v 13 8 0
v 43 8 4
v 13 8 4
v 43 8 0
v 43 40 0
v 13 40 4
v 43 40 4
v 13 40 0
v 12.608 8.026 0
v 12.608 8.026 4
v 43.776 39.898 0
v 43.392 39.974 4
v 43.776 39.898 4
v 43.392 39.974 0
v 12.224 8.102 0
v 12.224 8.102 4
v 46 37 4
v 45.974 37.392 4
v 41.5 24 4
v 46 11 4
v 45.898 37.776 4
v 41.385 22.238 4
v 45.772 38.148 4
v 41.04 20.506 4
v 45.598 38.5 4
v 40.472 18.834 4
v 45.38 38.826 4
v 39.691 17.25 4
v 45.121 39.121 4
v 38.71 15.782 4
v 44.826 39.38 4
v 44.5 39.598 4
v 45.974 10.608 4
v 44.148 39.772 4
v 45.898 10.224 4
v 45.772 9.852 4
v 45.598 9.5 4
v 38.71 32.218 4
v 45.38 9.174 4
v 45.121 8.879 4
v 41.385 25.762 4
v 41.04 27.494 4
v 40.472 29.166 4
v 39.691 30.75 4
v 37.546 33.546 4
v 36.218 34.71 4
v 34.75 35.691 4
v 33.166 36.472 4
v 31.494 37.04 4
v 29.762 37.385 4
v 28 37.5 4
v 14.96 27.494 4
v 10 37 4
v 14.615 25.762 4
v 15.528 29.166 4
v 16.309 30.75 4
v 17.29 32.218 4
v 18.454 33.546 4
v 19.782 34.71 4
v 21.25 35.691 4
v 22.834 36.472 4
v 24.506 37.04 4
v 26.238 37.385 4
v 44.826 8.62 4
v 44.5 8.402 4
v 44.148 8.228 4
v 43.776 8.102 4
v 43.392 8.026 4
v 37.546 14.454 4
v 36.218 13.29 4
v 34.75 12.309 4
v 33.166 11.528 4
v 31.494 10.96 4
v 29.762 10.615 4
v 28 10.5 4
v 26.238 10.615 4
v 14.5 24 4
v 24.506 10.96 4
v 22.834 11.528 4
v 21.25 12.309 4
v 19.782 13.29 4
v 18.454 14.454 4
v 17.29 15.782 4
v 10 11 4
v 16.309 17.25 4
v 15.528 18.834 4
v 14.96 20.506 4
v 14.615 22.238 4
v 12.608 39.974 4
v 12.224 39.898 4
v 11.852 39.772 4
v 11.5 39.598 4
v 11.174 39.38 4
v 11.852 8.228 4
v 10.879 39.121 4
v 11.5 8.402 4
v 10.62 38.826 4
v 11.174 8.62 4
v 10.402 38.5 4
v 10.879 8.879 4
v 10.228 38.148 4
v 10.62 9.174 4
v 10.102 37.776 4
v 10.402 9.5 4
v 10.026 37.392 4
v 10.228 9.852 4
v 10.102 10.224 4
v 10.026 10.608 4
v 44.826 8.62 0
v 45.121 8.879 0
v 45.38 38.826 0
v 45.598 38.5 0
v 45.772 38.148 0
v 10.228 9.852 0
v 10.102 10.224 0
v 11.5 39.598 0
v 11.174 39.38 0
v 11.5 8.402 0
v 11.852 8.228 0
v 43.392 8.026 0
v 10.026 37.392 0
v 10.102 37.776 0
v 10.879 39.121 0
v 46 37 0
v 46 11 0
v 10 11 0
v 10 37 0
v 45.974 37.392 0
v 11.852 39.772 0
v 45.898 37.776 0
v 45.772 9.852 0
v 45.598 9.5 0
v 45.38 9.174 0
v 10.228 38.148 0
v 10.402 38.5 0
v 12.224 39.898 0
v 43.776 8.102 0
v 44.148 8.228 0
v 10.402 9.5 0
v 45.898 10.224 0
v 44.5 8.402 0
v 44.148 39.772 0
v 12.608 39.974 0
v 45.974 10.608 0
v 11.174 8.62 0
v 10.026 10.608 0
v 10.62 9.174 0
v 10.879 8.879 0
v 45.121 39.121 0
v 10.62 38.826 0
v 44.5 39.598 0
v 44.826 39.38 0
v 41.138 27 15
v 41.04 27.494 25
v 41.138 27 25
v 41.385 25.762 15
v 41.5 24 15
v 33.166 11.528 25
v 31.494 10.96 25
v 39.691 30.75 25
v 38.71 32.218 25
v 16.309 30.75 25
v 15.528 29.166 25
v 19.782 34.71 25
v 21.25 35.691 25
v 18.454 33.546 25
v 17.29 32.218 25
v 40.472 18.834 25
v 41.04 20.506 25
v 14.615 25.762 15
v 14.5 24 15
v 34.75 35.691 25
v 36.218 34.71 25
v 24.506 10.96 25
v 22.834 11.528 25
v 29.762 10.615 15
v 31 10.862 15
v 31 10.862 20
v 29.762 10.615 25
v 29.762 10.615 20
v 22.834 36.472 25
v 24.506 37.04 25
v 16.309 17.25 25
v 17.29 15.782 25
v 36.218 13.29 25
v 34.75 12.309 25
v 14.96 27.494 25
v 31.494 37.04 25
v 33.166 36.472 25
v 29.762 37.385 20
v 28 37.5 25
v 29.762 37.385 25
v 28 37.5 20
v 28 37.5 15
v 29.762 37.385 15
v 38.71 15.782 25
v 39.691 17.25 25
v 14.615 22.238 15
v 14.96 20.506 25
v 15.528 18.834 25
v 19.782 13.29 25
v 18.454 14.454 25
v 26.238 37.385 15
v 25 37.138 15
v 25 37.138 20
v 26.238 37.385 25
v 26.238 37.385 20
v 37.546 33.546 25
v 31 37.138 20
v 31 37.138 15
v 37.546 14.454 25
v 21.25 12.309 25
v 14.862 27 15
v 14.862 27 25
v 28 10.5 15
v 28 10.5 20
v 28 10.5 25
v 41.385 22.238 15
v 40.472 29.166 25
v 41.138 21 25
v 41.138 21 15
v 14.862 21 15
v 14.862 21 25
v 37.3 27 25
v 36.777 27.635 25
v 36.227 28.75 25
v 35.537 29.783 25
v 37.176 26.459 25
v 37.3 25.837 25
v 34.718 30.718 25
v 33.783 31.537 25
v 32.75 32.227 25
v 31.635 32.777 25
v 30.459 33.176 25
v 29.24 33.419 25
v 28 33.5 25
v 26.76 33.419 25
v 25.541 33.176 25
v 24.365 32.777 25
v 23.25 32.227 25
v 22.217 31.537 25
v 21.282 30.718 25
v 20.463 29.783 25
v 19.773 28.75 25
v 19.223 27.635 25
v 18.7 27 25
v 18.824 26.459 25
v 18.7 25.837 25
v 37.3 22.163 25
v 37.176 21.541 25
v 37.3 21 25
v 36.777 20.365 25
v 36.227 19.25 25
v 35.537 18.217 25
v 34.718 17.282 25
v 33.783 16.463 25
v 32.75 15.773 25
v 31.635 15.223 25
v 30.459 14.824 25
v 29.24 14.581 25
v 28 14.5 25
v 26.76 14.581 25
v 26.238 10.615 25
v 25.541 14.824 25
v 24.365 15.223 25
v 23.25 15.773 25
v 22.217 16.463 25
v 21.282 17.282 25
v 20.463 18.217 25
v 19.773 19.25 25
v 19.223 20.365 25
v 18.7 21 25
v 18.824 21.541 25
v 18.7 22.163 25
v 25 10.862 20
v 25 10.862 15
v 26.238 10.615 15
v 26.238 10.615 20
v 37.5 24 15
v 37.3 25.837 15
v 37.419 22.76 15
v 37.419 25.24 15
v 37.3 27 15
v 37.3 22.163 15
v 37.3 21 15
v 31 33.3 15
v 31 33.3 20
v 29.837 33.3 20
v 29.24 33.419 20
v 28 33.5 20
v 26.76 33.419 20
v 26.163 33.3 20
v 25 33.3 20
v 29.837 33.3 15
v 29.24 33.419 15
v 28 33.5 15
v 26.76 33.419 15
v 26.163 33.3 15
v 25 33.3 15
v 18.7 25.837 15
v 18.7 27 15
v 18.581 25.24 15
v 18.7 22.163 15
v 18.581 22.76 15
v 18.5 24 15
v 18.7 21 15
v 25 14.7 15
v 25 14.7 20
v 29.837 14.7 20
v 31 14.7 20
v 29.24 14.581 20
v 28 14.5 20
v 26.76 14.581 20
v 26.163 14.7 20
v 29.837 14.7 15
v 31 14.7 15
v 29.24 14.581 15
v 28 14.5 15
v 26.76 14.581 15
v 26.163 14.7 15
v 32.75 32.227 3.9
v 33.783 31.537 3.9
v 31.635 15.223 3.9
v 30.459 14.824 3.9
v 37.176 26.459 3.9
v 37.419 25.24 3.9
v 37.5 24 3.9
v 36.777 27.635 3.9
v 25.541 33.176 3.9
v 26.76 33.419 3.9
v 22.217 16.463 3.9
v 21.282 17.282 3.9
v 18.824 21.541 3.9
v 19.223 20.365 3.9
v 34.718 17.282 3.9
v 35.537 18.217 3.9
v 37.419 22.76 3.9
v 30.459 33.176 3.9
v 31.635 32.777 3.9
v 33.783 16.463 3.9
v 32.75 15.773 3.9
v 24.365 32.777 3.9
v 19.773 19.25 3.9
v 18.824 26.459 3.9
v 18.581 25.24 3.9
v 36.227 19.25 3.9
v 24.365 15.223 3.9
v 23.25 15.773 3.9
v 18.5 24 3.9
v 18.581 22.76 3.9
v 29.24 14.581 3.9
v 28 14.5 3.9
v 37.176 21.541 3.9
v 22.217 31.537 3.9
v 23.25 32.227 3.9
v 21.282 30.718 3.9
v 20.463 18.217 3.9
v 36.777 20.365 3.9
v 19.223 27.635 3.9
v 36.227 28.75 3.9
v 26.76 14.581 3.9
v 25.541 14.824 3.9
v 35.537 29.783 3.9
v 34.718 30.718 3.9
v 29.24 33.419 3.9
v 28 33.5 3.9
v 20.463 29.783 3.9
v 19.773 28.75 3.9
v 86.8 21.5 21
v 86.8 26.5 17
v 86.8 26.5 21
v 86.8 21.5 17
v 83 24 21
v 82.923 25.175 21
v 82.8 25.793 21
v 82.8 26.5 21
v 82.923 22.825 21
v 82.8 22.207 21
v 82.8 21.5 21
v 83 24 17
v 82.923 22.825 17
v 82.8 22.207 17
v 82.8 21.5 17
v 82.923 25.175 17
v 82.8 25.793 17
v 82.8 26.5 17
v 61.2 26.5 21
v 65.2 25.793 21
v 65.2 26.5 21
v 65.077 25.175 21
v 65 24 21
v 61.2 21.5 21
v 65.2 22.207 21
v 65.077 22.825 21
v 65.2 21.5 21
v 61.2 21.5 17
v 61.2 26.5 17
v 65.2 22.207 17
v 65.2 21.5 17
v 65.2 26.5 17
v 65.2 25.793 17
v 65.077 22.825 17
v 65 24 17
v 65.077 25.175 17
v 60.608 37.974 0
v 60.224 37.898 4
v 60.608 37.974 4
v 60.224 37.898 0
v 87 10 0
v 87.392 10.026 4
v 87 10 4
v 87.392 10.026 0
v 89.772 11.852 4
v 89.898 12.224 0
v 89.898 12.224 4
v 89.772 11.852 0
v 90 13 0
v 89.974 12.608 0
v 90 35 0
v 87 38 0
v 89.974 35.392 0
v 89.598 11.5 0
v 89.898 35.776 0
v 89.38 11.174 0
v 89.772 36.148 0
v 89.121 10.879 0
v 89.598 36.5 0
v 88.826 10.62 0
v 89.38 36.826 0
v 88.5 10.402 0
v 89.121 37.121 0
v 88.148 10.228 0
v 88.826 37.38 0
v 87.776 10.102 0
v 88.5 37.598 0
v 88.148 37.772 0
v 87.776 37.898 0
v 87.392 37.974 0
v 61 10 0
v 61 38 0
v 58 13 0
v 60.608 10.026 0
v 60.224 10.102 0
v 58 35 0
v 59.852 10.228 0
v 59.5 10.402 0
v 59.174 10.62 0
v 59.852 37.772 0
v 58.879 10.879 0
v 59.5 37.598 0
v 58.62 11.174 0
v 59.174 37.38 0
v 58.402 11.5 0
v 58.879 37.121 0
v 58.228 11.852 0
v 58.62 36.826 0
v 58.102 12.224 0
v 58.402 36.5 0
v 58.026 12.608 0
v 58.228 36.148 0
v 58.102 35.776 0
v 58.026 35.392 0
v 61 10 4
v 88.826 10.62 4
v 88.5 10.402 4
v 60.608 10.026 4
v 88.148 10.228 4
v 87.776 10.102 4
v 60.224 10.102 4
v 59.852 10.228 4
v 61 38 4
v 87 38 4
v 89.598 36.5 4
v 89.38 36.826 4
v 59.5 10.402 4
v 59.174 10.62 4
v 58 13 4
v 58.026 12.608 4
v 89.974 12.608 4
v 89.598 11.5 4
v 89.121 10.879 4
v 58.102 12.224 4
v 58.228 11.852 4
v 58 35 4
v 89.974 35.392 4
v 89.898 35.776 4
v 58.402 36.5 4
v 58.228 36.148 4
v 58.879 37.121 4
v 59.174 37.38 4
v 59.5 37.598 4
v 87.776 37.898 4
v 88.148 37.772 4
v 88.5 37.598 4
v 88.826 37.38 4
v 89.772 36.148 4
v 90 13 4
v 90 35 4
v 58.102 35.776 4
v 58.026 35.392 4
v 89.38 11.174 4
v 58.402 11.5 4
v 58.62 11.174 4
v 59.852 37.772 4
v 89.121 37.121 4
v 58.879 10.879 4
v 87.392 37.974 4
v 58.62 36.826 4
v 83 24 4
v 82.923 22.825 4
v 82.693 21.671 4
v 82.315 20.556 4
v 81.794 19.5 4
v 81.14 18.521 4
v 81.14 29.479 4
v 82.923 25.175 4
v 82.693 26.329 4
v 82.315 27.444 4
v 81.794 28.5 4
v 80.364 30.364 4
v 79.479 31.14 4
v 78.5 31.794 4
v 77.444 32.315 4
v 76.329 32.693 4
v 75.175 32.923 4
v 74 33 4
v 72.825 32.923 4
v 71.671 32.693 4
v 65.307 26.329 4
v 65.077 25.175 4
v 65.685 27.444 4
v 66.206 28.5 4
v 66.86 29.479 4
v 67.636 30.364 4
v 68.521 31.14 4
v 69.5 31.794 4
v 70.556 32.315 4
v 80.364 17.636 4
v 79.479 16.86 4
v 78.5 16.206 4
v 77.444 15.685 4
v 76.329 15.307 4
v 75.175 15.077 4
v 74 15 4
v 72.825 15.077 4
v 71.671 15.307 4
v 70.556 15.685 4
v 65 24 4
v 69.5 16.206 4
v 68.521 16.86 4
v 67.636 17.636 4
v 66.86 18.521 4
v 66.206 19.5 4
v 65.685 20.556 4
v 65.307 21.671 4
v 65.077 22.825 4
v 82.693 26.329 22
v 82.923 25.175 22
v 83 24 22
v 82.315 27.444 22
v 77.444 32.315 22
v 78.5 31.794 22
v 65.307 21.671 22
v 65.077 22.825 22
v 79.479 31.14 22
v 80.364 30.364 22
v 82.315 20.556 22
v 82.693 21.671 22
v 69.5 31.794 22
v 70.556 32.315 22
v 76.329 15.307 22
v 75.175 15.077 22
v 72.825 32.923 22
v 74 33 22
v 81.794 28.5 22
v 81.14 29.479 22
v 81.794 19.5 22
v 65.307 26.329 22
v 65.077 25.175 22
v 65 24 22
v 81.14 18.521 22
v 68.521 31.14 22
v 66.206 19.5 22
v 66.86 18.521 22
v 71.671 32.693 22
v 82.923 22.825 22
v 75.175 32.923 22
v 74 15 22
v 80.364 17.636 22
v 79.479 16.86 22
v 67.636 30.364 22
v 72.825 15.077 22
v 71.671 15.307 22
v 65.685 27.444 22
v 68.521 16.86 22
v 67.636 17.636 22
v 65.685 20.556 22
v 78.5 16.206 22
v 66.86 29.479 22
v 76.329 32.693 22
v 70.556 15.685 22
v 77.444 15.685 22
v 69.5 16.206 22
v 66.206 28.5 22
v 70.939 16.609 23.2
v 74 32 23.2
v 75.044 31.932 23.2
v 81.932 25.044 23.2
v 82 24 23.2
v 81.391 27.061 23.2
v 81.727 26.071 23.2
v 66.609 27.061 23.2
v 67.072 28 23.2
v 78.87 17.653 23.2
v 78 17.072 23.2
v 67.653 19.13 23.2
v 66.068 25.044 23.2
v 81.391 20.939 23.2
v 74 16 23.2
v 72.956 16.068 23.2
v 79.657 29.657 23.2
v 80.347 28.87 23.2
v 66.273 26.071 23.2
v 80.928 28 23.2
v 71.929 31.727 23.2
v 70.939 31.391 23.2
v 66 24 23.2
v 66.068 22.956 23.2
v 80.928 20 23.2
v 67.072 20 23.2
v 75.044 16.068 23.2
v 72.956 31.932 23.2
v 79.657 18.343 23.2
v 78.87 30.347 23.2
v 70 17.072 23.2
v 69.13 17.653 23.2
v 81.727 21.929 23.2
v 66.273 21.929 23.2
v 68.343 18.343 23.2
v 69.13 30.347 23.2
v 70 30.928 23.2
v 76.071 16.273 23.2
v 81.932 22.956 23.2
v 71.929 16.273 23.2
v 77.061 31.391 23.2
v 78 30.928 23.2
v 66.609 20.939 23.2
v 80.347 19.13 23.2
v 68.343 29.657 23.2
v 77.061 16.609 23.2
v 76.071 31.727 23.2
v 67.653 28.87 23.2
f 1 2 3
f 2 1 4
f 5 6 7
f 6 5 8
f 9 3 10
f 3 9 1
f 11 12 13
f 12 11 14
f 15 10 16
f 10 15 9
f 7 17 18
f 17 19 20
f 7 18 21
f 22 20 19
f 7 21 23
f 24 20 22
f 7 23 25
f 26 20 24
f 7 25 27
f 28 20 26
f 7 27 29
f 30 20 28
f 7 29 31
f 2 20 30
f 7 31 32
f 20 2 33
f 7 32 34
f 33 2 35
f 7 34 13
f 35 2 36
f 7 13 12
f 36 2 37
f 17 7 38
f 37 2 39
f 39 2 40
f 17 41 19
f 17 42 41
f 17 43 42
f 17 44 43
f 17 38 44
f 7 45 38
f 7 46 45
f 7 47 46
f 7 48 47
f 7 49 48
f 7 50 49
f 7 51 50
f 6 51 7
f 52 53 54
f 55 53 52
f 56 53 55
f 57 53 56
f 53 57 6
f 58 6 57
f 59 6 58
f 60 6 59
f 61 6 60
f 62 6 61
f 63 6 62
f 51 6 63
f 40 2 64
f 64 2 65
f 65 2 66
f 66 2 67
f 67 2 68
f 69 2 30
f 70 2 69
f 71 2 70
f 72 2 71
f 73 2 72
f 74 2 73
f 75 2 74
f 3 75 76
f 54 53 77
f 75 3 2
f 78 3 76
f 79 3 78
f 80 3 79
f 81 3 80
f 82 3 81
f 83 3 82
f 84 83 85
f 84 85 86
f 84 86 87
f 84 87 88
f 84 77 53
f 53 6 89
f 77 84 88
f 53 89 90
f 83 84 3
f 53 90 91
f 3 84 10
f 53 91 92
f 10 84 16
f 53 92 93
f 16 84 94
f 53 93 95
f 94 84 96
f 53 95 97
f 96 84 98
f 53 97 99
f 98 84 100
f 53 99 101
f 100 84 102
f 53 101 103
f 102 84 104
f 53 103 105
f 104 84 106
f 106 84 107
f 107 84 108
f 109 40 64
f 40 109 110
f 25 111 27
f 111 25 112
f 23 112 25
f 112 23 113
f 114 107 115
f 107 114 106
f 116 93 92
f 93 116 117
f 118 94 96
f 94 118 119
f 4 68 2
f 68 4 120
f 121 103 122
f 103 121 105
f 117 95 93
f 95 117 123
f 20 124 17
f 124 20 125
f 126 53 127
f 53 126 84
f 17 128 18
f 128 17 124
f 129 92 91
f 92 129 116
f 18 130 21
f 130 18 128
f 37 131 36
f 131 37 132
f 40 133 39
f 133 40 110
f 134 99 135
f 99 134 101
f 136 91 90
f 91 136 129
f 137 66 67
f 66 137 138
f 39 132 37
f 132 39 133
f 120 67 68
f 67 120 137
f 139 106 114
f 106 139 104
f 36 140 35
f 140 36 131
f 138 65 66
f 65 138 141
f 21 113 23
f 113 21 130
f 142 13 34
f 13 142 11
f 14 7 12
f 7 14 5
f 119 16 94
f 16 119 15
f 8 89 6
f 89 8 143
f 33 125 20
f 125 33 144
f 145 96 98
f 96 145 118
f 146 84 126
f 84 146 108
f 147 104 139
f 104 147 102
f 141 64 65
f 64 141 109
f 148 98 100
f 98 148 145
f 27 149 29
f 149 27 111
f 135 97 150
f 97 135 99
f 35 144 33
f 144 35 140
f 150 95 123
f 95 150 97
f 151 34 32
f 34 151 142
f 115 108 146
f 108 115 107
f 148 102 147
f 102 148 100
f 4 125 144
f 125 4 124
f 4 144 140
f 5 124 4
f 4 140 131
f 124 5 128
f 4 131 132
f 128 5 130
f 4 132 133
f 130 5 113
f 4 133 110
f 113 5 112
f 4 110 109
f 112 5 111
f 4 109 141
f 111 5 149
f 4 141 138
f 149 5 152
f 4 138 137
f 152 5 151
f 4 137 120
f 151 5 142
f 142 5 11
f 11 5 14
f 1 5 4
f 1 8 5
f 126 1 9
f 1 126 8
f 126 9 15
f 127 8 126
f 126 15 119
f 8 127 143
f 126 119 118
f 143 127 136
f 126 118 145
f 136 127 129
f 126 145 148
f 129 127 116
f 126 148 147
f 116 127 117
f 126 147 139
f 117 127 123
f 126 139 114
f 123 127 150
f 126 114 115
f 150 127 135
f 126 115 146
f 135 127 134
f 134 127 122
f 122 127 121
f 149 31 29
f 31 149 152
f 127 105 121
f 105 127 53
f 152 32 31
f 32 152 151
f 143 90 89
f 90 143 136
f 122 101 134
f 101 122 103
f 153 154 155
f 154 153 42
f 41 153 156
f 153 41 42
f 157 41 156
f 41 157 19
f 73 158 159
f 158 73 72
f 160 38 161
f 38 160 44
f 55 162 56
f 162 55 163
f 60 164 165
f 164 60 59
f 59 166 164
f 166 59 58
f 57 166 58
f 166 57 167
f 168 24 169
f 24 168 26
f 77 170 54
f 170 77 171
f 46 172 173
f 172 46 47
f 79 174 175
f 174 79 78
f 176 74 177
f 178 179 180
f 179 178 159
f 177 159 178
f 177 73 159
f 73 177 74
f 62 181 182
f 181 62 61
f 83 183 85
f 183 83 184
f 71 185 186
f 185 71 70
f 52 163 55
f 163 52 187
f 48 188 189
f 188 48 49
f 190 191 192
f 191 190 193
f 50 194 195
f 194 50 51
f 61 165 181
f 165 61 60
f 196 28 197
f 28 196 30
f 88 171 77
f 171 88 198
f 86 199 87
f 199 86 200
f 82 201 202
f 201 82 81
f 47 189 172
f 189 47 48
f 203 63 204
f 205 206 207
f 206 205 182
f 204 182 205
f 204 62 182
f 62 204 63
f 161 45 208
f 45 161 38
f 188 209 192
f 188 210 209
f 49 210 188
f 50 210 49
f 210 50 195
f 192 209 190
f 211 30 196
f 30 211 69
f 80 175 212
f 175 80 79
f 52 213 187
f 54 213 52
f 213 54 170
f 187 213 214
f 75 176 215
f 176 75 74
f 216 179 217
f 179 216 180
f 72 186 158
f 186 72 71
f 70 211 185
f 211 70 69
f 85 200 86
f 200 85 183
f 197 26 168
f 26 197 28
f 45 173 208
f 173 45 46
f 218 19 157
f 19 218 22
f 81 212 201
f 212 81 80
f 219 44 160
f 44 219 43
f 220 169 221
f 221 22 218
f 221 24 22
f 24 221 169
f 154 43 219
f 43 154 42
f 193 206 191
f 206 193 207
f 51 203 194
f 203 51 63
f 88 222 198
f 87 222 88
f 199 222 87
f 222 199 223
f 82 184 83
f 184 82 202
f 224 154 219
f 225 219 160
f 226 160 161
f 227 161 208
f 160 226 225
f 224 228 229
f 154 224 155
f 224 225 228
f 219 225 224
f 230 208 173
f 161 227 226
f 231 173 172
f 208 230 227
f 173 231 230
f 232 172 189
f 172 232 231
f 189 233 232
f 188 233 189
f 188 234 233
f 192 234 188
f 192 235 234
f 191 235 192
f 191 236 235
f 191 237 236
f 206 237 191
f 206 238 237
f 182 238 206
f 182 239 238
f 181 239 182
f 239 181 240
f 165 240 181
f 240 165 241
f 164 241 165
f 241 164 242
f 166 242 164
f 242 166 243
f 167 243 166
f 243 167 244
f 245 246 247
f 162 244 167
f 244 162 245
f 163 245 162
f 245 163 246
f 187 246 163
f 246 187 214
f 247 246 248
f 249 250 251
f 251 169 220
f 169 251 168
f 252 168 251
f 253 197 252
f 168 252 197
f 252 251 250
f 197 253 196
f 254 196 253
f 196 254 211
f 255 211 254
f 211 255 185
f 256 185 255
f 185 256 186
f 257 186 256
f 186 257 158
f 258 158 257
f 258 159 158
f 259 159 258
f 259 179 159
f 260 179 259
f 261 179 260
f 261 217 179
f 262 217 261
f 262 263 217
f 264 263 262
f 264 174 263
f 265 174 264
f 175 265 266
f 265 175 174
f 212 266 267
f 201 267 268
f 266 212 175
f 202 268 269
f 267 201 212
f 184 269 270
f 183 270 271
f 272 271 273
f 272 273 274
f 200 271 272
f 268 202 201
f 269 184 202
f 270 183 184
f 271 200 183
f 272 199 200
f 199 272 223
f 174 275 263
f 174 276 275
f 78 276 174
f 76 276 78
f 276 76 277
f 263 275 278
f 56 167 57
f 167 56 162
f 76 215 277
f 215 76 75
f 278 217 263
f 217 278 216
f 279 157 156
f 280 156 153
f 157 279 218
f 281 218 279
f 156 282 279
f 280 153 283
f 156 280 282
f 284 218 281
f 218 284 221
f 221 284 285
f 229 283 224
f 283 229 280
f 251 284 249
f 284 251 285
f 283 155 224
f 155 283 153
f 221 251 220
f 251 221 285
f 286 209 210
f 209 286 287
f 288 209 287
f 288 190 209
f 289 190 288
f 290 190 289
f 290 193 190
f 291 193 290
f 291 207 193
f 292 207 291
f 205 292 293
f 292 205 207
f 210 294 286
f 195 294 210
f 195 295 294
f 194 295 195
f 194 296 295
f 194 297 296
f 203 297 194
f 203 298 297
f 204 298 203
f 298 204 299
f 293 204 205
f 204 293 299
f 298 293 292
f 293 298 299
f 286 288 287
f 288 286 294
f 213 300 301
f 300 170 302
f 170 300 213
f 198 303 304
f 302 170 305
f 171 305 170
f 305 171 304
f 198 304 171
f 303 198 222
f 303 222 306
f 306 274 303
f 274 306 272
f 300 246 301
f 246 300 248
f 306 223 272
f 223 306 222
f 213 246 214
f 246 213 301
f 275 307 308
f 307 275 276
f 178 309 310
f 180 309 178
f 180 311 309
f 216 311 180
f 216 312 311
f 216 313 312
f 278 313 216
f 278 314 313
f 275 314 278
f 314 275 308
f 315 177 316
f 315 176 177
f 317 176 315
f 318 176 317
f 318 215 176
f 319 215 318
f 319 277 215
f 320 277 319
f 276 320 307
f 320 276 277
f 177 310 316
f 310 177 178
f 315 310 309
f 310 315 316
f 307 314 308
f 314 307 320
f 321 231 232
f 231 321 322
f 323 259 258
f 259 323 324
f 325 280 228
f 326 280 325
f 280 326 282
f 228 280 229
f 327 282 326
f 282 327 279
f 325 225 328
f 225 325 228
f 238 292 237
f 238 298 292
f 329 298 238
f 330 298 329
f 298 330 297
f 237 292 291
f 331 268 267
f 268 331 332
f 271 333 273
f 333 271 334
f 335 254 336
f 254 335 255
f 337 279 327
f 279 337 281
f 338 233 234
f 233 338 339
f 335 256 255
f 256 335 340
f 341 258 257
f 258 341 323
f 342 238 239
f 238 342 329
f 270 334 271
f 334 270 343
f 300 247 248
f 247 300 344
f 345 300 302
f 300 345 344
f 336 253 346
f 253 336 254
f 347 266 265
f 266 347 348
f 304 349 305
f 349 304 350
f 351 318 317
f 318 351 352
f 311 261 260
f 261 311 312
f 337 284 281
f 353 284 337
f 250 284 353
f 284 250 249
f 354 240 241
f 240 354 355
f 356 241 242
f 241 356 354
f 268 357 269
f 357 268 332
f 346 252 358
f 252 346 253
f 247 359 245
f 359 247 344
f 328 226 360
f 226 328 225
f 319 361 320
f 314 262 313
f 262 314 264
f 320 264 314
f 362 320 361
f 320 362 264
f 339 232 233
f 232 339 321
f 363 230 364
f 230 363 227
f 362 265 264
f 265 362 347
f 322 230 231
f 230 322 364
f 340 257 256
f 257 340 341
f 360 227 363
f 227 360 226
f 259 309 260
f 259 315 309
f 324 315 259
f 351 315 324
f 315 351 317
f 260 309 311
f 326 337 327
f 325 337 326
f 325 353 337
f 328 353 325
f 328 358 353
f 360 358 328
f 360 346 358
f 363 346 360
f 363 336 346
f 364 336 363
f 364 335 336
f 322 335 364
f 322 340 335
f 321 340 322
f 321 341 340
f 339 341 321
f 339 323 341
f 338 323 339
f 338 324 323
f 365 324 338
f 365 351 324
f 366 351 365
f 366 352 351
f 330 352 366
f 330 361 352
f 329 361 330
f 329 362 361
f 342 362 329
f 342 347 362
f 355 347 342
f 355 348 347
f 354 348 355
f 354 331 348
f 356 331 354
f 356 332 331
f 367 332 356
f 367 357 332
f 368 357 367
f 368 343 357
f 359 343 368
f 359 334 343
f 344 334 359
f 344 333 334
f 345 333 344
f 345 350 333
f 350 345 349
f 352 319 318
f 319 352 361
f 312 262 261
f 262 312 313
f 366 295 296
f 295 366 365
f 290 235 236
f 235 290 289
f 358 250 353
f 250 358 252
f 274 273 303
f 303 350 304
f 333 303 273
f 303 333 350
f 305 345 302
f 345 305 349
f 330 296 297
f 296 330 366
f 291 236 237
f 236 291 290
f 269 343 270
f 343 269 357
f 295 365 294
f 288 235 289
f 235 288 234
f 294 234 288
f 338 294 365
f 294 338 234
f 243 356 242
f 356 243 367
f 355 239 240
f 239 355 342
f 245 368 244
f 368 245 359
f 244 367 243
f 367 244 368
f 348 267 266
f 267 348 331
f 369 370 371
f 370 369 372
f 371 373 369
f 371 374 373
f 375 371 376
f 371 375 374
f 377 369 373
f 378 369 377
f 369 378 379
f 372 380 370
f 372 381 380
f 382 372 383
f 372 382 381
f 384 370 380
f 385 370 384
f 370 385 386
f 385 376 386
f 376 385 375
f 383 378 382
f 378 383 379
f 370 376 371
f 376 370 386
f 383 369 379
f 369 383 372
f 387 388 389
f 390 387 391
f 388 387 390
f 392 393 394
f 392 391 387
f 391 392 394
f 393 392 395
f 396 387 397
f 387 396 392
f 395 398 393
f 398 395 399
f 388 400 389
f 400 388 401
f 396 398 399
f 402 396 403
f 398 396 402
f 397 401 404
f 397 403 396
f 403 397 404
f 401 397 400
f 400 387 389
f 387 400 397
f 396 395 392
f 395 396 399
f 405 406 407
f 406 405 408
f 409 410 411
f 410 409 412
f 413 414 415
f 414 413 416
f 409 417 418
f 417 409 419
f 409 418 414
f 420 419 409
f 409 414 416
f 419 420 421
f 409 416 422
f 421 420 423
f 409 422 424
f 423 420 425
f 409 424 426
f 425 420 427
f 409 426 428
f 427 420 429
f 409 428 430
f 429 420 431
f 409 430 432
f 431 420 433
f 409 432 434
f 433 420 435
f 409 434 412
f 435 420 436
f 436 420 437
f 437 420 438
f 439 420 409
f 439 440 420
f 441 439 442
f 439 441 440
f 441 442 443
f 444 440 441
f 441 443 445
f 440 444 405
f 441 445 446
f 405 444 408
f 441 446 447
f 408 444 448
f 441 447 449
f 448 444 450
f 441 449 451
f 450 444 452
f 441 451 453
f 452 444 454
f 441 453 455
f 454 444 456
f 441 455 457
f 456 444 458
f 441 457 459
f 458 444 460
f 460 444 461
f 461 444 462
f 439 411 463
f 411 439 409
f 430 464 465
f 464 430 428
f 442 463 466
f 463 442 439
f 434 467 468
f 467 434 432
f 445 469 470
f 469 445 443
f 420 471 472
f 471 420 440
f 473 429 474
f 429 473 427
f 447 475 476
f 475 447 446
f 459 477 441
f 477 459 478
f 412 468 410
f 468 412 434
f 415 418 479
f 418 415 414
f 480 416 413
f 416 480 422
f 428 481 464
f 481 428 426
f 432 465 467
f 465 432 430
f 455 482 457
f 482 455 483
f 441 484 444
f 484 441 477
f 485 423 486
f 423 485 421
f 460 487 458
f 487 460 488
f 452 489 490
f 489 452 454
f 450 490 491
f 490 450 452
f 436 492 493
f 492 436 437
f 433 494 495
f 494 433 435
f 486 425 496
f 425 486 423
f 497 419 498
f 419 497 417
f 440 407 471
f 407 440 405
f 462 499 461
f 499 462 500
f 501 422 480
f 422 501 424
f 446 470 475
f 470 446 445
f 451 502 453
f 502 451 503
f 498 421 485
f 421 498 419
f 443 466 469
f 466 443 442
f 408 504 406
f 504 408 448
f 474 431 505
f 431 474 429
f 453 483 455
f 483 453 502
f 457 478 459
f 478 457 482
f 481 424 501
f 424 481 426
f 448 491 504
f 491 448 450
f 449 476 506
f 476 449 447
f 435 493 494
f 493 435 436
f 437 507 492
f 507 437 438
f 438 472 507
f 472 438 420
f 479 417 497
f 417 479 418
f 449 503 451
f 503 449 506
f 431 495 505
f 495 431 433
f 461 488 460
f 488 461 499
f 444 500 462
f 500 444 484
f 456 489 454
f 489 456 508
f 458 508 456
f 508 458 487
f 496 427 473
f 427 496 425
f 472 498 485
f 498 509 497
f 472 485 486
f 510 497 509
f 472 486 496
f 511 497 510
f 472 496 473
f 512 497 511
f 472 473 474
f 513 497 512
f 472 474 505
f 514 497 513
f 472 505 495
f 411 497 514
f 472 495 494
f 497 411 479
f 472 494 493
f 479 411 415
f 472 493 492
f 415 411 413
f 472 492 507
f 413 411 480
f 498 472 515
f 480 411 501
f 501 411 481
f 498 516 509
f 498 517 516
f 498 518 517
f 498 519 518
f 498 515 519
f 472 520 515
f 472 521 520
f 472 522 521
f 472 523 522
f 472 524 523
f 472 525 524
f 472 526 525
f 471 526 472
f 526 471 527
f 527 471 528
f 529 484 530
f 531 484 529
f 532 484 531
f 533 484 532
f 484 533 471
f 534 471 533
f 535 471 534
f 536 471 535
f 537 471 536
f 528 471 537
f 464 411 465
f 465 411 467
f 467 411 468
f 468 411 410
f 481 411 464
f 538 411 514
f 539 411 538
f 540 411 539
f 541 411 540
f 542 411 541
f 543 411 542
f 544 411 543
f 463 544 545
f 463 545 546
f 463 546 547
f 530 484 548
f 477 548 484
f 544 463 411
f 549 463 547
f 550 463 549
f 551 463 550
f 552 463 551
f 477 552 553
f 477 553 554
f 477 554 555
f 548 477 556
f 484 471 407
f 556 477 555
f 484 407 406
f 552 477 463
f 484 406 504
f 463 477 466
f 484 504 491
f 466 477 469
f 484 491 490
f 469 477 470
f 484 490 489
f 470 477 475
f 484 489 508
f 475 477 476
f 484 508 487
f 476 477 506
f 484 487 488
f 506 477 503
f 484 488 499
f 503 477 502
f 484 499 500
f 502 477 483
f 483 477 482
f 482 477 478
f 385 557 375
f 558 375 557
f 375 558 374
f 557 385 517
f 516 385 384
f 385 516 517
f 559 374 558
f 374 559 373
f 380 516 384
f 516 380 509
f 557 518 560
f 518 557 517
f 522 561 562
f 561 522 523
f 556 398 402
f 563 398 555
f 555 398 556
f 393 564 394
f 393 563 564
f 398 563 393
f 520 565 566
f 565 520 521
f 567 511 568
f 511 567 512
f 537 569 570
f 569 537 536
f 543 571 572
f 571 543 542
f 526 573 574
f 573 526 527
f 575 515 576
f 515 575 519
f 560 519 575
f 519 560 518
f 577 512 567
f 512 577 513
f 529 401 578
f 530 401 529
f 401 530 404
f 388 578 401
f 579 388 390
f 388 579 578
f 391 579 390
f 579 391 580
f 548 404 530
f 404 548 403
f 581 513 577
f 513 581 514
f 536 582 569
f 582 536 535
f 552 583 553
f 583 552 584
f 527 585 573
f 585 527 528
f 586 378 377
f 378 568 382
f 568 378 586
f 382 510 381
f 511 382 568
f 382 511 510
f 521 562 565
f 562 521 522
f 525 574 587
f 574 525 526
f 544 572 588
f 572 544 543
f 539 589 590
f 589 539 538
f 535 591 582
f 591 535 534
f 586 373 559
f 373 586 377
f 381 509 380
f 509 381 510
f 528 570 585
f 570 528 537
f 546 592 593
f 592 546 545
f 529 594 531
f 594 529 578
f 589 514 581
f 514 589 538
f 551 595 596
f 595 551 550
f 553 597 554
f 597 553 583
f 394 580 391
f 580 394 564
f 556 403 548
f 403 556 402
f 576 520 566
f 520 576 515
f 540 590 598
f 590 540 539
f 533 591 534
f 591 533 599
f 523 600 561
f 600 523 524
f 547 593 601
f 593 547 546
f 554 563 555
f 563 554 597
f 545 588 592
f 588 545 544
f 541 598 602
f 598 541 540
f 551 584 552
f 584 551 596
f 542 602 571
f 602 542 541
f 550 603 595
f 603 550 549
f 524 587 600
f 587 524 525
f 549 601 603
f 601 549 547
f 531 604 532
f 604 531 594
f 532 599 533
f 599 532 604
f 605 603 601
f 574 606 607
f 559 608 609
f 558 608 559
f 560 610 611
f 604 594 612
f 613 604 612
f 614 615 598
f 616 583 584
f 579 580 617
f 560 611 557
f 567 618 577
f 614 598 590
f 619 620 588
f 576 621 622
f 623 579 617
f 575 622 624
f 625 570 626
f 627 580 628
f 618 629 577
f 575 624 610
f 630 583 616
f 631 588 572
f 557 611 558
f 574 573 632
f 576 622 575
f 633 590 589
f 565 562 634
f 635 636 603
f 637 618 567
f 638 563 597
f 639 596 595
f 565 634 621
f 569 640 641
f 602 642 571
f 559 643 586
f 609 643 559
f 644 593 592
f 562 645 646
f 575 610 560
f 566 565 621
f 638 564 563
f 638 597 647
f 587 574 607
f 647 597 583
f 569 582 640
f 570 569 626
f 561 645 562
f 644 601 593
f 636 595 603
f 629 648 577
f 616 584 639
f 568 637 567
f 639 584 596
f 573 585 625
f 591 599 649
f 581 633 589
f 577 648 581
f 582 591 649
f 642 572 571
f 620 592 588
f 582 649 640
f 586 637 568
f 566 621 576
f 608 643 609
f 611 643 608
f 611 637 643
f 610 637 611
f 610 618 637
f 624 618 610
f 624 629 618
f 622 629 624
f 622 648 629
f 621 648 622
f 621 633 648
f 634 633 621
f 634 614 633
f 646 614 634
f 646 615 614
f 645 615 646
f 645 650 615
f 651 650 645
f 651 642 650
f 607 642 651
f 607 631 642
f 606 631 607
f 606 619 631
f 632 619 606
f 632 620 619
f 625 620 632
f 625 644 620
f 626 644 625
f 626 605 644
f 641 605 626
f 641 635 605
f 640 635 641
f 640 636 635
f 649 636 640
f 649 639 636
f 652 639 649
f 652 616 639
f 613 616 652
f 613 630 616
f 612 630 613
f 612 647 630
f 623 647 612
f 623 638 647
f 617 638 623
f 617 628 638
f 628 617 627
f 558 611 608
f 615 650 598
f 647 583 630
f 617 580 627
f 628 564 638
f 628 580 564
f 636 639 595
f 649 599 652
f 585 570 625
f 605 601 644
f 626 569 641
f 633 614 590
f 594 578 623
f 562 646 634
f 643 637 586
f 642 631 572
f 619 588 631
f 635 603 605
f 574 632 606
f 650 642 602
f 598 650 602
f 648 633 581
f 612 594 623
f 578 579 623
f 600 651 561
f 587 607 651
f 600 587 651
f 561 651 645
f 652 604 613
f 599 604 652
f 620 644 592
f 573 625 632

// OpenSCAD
/*
Sample 080: Bajonett-Vierteldrehverschluss — 0,50 mm
Generated from the FDM Mechanical Sample Library.
Units: millimetres.

Override examples:
  openscad -o custom.stl -D 'view="plate"' -D 'render_fn=64' model.scad
  openscad -o preview.png -D 'view="assembly"' model.scad
*/
use <../../../library/fdm_mechanisms.scad>

render_fn = is_undef(render_fn) ? 48 : render_fn;
view = is_undef(view) ? "plate" : view;
$fn = render_fn;

sample_bayonet(
    view=view,
    core_d=18,
    clearance=0.5,
    lug_w=5
);
